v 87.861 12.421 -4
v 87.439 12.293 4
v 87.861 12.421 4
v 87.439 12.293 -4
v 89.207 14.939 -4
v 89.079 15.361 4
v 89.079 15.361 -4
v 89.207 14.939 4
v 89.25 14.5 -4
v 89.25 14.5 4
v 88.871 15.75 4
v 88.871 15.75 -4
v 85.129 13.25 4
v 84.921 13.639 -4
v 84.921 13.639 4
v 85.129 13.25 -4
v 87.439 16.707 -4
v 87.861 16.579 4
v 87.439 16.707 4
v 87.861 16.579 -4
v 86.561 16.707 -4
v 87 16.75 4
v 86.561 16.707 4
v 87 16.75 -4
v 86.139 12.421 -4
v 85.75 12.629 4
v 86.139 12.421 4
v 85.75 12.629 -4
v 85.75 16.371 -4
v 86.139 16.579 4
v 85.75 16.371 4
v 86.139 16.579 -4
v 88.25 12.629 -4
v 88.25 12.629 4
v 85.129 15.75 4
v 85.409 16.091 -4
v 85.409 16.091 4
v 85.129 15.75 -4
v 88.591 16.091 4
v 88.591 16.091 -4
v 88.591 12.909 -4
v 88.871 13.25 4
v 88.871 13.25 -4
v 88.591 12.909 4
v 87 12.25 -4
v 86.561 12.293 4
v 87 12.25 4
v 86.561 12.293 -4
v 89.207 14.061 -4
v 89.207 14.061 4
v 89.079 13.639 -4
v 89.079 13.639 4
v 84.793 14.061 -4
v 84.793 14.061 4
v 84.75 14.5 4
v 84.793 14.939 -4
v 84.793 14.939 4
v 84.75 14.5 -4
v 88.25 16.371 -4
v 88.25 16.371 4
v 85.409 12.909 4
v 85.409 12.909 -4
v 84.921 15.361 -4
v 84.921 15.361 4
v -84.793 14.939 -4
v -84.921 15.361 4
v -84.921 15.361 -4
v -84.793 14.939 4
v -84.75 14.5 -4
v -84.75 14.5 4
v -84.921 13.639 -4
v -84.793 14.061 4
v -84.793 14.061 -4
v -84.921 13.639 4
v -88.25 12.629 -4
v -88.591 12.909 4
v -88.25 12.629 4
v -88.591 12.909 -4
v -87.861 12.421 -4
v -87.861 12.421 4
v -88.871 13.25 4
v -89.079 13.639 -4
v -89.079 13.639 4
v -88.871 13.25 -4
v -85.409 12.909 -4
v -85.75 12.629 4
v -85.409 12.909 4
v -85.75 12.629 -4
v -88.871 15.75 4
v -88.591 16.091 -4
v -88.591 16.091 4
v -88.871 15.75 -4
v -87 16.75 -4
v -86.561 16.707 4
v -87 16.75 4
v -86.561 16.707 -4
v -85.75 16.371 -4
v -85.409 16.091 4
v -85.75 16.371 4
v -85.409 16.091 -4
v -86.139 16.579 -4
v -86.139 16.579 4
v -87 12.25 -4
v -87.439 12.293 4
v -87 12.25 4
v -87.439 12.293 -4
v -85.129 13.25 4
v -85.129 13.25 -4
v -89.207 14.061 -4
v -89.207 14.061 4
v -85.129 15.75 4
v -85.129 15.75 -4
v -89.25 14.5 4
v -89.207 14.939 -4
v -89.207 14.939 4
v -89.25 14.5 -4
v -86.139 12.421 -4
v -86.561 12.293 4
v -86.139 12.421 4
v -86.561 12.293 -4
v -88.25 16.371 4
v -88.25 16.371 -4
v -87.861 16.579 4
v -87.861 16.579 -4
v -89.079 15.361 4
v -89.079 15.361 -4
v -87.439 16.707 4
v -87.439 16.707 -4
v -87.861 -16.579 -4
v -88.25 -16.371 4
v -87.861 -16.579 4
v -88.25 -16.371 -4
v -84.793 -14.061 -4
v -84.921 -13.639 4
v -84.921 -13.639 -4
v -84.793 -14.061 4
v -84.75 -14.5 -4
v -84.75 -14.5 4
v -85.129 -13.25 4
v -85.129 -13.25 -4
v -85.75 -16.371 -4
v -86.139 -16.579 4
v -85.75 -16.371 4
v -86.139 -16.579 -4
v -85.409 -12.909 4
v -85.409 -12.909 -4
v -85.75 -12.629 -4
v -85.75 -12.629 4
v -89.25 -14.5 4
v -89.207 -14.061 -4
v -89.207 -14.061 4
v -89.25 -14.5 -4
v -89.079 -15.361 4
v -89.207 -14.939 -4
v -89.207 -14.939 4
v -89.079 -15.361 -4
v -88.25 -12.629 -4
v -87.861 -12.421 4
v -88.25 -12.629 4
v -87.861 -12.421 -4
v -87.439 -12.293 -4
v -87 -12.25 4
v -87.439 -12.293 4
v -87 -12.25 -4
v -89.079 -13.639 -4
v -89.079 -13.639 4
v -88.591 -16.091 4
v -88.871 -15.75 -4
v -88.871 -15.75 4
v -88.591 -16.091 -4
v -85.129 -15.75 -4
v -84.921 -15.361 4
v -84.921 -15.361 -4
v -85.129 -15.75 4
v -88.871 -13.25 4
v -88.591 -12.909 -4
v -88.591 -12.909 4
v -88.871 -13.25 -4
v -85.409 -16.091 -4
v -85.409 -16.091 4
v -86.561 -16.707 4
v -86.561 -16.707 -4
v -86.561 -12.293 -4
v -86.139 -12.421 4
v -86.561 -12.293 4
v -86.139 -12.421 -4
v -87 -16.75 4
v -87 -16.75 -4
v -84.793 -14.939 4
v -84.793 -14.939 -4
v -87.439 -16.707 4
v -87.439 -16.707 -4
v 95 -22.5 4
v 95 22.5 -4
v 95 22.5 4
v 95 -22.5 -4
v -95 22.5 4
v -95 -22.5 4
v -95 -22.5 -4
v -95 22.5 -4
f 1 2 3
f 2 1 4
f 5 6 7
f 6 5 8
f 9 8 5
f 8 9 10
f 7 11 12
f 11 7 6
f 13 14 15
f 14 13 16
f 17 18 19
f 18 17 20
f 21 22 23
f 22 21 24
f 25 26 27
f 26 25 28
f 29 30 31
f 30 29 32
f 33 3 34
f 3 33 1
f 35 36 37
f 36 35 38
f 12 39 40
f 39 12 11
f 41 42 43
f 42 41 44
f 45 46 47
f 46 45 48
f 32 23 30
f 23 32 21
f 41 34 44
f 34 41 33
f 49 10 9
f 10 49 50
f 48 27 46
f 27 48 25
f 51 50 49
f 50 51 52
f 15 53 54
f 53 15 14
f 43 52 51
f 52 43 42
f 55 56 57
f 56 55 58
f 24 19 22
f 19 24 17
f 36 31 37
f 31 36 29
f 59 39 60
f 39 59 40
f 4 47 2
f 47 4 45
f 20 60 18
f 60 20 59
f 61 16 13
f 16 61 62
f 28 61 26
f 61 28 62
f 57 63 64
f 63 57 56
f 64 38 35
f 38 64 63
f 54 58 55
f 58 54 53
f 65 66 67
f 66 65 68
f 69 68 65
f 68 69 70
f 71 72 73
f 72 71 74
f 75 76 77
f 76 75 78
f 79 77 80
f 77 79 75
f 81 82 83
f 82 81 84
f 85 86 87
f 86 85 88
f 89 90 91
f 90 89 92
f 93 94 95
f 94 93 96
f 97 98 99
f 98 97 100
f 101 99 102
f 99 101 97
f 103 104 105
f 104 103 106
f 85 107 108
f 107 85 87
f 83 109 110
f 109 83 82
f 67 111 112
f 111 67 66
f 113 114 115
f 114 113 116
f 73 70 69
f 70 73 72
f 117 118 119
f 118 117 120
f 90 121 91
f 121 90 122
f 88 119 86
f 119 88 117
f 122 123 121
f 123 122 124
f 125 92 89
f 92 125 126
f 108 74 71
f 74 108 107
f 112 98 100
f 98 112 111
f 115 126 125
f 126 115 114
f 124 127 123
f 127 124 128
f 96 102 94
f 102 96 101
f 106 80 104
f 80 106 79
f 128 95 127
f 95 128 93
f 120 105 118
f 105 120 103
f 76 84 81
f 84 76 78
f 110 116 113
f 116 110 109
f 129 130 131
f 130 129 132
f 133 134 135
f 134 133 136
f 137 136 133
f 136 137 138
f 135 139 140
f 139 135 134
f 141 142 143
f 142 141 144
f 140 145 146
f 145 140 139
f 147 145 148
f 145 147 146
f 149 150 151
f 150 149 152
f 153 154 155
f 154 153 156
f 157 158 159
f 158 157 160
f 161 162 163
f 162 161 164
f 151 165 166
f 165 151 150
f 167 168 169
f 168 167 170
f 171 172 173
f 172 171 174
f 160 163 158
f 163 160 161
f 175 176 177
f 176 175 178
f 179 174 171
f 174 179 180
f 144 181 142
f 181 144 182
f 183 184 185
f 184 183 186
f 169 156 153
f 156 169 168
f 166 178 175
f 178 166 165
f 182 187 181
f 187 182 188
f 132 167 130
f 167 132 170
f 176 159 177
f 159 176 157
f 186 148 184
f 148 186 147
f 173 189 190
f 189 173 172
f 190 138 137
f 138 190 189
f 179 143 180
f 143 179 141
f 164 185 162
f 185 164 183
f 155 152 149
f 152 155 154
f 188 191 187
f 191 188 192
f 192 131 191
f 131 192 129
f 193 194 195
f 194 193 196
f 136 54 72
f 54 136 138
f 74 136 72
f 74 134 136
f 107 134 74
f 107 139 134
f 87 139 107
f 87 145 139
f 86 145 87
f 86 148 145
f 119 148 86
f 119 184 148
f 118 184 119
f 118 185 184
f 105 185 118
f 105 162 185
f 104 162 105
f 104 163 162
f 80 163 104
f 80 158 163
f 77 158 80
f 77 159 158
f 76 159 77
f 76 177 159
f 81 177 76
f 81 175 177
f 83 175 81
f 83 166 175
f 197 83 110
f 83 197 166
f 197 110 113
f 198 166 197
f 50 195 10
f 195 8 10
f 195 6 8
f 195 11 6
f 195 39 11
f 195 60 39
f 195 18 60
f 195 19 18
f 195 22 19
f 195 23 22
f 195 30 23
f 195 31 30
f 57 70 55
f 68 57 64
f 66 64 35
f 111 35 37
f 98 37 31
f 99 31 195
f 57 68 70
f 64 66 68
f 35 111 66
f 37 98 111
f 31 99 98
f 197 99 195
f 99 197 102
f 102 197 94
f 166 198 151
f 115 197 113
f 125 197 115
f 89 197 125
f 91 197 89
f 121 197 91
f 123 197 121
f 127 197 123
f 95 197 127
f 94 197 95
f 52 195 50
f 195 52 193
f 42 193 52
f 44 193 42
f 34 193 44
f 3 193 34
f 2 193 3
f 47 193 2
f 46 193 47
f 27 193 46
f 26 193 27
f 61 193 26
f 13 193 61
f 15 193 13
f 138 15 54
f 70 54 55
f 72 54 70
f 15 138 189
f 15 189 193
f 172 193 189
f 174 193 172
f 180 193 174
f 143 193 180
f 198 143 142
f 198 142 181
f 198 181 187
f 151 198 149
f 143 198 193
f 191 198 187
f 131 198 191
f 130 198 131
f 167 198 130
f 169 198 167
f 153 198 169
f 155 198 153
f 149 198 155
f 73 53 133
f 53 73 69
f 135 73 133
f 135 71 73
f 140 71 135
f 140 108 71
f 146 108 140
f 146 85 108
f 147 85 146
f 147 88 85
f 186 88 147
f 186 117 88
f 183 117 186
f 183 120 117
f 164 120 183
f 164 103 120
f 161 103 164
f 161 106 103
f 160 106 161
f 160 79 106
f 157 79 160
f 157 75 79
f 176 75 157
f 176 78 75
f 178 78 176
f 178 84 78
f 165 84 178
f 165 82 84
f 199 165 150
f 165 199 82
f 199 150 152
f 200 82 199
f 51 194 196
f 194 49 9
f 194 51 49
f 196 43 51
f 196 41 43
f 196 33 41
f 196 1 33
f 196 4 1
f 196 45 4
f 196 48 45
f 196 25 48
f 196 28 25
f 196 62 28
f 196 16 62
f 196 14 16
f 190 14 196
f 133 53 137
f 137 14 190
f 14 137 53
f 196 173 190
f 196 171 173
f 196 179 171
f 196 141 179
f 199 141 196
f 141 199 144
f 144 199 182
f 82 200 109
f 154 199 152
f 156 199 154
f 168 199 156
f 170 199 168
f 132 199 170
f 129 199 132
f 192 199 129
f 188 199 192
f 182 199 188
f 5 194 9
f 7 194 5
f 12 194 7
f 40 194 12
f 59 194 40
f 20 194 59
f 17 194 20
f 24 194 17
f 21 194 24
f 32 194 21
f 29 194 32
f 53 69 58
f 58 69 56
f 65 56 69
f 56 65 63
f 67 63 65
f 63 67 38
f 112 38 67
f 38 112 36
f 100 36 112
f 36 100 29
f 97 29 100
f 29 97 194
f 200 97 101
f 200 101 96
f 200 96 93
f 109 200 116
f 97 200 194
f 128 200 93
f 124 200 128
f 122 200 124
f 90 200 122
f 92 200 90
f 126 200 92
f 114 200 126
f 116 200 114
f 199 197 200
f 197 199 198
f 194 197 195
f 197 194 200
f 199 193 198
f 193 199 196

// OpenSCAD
$fn = 32;

// ----------------------------------------------------------------------
// Corner plate 190 x 45 x 8
// 3 holes, centres taken from the edge offset
// ----------------------------------------------------------------------

// --- parameters (mm) ---
plate = [190, 45, 8];  // overall size (x, y, z)
holes = 3;             // number of holes the drawing asks for
hole_d = 4.5;          // hole diameter
edge = 8;              // hole centre offset from the plate edge

// --- derived feature positions (mm) ---
corner_x = plate[0] / 2 - edge;  // = 87   corner hole X
corner_y = plate[1] / 2 - edge;  // = 14.5   corner hole Y
feature_centers = [
  [corner_x, corner_y],
  [-corner_x, corner_y],
  [-corner_x, -corner_y]
];   // hole centres the loop below drills

// plate outline, every hole drilled through with the same cutters
difference() {
  cube(plate, center = true);
  for (centre = feature_centers)
    translate([centre[0], centre[1], 0])
      cylinder(d = hole_d, h = plate[2] + 2, center = true);
}
